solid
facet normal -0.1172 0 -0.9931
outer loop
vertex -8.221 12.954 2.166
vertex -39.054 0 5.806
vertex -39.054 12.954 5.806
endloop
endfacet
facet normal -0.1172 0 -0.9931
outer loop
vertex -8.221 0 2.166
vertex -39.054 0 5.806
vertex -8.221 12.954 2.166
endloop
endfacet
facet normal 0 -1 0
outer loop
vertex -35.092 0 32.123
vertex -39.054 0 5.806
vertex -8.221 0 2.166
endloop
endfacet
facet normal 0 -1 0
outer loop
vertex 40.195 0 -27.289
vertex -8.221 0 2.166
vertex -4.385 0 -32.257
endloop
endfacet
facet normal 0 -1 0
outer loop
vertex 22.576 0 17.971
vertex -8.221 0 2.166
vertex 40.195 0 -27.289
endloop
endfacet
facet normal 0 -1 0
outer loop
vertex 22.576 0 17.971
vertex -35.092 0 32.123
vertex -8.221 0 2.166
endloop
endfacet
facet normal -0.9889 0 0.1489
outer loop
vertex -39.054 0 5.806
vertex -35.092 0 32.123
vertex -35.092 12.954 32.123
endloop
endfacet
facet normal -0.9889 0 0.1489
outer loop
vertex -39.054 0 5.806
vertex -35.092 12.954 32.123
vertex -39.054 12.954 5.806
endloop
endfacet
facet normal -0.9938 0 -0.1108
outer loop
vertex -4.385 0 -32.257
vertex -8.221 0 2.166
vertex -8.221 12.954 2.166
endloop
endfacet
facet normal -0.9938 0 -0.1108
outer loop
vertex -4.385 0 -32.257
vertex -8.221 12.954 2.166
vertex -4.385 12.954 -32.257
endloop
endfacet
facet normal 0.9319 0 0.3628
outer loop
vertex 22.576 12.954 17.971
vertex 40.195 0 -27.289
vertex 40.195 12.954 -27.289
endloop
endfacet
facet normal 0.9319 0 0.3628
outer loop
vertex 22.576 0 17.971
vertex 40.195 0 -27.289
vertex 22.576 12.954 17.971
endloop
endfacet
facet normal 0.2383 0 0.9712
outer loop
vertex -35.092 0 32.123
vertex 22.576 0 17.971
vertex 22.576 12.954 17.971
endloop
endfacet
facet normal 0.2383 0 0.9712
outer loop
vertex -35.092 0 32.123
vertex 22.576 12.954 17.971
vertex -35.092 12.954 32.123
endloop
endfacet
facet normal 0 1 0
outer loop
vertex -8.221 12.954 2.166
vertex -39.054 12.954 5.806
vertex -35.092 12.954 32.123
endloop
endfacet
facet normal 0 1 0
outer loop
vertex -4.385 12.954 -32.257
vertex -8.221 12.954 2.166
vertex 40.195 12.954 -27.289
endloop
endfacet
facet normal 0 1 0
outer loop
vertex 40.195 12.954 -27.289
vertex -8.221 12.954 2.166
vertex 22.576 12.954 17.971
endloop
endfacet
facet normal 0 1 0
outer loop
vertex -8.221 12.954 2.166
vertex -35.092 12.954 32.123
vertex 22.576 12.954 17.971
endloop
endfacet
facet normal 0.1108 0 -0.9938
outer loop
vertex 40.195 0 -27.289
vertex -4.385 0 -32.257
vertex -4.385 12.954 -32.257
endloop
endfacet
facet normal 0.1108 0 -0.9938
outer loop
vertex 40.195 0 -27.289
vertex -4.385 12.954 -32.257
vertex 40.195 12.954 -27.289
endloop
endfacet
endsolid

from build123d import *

# Parameters (mm, degrees)
F1_DEPTH = 12.954
F2_R     = 10.50497
F3_DEPTH = 10.668


with BuildPart() as f1:
    # F0 (on Front) → F1 (new body)
    with BuildSketch(Plane.XZ):
        Polygon((22.575585, 17.971164), (-35.091735, 32.122731), (-39.053906, 5.805923), (-8.221038, 2.165531), (-4.384858, -32.257307), (40.195391, -27.289156), align=None)
    extrude(amount=-F1_DEPTH)

    # F2 (on face) → F3 (join)
    with BuildSketch(Plane(origin=(0, 12.954, 0), x_dir=(-1, 0, 0), z_dir=(0, 1, 0))):
        with Locations((-14.078603, 2.165531)):
            Circle(F2_R)
    extrude(amount=-F3_DEPTH)


solid = f1.part
